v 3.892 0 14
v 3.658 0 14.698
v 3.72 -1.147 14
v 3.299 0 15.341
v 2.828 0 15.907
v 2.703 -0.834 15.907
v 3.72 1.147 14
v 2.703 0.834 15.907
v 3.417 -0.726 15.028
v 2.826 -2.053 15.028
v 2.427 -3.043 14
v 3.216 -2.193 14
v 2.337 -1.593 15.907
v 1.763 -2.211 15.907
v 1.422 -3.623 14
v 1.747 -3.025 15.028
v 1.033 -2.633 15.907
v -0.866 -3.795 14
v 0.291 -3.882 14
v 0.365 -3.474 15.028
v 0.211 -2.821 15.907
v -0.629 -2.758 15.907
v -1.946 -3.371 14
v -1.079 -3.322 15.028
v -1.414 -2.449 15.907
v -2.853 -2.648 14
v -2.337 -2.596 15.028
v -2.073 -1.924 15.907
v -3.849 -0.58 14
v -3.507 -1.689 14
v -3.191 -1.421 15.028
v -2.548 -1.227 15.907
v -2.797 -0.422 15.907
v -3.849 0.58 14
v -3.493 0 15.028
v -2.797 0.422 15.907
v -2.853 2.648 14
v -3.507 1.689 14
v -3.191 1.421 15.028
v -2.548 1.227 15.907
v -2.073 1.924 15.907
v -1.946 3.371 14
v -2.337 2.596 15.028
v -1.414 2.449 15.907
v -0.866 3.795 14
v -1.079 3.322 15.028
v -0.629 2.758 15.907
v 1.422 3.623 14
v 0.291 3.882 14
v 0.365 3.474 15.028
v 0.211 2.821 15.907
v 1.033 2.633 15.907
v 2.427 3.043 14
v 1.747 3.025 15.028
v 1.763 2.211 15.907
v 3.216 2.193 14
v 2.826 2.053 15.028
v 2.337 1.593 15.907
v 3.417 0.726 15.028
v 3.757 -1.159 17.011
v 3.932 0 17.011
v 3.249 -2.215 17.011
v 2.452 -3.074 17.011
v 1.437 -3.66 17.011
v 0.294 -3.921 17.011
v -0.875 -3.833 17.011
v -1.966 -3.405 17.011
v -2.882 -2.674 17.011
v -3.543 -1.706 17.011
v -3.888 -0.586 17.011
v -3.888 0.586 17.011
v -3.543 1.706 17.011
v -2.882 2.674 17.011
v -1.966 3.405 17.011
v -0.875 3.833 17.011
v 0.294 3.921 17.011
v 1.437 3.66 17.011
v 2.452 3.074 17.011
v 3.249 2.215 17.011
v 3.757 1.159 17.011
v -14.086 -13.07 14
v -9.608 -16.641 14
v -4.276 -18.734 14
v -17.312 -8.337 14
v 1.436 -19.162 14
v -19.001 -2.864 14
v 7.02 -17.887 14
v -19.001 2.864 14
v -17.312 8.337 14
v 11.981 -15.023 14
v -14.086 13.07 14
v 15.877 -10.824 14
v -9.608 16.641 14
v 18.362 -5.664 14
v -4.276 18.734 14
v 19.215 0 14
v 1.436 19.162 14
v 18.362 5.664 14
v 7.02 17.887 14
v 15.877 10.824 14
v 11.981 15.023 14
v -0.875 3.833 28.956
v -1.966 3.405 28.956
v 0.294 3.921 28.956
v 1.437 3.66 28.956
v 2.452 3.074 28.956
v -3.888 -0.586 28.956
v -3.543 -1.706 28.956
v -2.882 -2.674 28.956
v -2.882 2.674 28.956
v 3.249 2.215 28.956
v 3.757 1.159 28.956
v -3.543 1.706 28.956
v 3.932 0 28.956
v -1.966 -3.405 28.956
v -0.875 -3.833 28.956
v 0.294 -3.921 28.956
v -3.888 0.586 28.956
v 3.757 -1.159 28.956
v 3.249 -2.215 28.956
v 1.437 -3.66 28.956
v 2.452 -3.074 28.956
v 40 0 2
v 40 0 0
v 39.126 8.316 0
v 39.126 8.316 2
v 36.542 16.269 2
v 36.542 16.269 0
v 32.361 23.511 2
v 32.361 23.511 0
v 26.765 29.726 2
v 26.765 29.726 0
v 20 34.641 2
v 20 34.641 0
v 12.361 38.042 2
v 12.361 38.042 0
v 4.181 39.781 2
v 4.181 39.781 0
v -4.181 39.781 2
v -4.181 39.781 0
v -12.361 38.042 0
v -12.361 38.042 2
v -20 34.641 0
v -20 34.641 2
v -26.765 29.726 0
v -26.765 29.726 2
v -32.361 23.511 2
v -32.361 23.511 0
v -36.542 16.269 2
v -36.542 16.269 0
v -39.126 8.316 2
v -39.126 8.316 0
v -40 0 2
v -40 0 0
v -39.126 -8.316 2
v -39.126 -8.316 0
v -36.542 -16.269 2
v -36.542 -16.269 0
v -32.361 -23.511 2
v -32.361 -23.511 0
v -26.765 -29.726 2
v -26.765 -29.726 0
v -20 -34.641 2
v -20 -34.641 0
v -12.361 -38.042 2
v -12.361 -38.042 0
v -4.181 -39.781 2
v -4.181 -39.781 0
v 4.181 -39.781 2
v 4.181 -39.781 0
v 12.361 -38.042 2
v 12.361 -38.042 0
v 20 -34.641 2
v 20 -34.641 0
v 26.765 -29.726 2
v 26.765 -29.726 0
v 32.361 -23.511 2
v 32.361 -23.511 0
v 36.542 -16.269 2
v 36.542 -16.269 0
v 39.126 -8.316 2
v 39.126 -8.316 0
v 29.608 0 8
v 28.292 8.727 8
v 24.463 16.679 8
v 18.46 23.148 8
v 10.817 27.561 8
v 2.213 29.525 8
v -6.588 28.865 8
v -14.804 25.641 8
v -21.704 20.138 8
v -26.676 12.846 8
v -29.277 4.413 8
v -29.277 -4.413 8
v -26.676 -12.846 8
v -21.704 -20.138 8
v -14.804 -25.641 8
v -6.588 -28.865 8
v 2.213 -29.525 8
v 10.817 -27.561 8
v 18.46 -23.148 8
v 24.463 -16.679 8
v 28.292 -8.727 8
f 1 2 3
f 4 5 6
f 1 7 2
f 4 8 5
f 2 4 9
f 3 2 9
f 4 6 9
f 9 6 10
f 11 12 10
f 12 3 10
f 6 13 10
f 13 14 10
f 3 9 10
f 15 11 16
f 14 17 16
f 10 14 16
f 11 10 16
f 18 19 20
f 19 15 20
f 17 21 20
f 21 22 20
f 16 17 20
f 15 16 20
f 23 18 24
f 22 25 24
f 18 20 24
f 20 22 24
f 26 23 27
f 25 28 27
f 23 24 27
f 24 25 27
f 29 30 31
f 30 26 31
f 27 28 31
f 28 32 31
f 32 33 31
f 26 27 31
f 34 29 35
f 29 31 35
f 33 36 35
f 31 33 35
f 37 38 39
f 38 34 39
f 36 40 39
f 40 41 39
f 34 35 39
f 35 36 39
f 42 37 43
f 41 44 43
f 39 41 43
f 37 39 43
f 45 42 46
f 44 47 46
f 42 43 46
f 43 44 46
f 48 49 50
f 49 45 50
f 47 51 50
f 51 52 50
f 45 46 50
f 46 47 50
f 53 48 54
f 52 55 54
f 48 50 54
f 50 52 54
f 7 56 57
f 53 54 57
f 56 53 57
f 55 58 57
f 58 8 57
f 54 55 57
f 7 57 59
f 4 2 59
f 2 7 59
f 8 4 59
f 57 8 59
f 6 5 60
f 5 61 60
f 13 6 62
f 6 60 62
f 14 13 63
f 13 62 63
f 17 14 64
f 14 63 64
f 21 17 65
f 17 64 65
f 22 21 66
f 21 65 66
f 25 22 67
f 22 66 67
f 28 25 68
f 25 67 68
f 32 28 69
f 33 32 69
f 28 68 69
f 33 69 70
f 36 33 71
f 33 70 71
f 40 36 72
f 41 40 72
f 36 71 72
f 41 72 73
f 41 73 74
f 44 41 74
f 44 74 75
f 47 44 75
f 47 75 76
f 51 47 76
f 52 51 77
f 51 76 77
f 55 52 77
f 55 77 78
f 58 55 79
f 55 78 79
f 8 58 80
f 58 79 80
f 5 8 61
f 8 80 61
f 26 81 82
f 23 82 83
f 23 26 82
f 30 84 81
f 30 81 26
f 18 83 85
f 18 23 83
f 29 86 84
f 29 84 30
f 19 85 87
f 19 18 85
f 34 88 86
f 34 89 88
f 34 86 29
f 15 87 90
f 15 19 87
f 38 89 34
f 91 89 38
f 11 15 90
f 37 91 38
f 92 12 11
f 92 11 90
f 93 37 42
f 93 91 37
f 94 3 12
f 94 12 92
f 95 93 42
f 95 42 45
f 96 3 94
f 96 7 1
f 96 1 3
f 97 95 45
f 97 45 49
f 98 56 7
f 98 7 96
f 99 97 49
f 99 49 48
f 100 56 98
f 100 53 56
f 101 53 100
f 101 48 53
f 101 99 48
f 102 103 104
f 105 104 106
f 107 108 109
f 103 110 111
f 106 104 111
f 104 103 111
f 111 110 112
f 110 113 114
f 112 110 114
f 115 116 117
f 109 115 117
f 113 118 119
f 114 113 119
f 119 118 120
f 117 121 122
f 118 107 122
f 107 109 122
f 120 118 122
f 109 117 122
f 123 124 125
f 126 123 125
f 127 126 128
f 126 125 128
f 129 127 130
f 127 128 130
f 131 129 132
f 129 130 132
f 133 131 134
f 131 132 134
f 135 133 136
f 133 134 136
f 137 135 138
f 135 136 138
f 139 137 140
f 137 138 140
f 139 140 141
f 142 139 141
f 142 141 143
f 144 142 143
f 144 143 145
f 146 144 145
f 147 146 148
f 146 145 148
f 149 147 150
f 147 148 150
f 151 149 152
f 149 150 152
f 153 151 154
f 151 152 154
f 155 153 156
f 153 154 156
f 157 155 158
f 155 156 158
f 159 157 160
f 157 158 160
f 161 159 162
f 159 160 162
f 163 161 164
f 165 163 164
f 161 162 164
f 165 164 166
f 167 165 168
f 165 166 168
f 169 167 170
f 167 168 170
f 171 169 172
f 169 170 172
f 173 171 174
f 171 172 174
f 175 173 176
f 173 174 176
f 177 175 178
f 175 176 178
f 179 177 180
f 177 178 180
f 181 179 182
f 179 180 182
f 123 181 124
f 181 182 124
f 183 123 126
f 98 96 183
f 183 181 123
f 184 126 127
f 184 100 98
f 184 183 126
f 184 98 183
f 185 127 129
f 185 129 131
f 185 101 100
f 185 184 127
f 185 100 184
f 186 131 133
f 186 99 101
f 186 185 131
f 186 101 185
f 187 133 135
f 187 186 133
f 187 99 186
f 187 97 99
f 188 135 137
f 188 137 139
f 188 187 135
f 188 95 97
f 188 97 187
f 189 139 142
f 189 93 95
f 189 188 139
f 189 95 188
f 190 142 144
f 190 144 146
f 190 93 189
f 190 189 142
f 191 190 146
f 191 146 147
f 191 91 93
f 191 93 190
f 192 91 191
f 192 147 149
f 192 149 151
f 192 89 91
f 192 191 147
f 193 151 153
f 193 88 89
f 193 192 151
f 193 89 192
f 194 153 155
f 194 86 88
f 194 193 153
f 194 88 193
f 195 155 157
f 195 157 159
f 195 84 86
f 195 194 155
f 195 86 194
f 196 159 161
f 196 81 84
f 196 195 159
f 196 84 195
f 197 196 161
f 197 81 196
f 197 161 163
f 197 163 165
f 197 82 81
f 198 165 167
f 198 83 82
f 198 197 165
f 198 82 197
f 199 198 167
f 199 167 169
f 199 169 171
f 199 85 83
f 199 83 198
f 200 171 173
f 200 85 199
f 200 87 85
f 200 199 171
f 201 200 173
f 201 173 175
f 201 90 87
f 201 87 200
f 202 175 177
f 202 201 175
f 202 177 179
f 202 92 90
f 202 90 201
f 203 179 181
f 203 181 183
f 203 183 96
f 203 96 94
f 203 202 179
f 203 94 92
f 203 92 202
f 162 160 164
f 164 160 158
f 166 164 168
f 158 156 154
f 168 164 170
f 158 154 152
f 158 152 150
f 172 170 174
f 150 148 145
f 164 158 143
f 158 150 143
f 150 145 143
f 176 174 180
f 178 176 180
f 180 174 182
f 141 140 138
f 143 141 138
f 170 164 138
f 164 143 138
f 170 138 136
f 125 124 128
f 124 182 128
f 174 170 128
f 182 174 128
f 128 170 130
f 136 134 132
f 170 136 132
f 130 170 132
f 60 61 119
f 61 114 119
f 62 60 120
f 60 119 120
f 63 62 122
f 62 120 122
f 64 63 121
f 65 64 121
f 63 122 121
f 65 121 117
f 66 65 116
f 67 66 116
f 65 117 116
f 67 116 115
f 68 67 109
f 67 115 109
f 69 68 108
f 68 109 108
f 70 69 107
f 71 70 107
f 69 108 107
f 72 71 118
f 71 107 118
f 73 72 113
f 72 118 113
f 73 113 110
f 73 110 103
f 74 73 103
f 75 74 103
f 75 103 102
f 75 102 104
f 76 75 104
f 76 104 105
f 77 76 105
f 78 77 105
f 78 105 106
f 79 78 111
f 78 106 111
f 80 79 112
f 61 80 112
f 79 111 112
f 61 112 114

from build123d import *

# Parameters (mm, degrees)
ESQUISSE1_R        = 40
BOSS_EXTRU_1_DEPTH = 2
ESQUISSE2_R        = 40
BOSS_EXTRU_2_DEPTH = 12
BOSS_EXTRU_2_TAPER = 60


with BuildPart() as part:
    # Esquisse1 → Boss.-Extru.1 (new body)
    with BuildSketch(Plane.XY):
        Circle(ESQUISSE1_R)
    extrude(amount=BOSS_EXTRU_1_DEPTH)

    # Esquisse2 → Boss.-Extru.2 (add)
    with BuildSketch(Plane.XY.offset(2)):
        Circle(ESQUISSE2_R)
    extrude(amount=BOSS_EXTRU_2_DEPTH, taper=BOSS_EXTRU_2_TAPER)

    # Esquisse3 → Révolution1 (revolve)
    with BuildSketch(Plane(origin=(0, 0, 0), x_dir=(1, 0, 0), z_dir=(0, 1, 0))):
        with BuildLine():
            Line((2.828427125, -15.907299026), (3.932041335, -17.010913236))
            Line((3.932041335, -17.010913236), (3.932041335, -28.955760853))
            Line((3.932041335, -28.955760853), (0, -28.955760853))
            Line((0, -28.955760853), (0, -9.078871902))
            ThreePointArc((0, -9.078871902), (3.69551813, -11.548138172), (2.828427125, -15.907299026))
        make_face()
    revolve(axis=Axis((0, 0, 28.955760853), (0, 0, -1)))


solid = part.part
